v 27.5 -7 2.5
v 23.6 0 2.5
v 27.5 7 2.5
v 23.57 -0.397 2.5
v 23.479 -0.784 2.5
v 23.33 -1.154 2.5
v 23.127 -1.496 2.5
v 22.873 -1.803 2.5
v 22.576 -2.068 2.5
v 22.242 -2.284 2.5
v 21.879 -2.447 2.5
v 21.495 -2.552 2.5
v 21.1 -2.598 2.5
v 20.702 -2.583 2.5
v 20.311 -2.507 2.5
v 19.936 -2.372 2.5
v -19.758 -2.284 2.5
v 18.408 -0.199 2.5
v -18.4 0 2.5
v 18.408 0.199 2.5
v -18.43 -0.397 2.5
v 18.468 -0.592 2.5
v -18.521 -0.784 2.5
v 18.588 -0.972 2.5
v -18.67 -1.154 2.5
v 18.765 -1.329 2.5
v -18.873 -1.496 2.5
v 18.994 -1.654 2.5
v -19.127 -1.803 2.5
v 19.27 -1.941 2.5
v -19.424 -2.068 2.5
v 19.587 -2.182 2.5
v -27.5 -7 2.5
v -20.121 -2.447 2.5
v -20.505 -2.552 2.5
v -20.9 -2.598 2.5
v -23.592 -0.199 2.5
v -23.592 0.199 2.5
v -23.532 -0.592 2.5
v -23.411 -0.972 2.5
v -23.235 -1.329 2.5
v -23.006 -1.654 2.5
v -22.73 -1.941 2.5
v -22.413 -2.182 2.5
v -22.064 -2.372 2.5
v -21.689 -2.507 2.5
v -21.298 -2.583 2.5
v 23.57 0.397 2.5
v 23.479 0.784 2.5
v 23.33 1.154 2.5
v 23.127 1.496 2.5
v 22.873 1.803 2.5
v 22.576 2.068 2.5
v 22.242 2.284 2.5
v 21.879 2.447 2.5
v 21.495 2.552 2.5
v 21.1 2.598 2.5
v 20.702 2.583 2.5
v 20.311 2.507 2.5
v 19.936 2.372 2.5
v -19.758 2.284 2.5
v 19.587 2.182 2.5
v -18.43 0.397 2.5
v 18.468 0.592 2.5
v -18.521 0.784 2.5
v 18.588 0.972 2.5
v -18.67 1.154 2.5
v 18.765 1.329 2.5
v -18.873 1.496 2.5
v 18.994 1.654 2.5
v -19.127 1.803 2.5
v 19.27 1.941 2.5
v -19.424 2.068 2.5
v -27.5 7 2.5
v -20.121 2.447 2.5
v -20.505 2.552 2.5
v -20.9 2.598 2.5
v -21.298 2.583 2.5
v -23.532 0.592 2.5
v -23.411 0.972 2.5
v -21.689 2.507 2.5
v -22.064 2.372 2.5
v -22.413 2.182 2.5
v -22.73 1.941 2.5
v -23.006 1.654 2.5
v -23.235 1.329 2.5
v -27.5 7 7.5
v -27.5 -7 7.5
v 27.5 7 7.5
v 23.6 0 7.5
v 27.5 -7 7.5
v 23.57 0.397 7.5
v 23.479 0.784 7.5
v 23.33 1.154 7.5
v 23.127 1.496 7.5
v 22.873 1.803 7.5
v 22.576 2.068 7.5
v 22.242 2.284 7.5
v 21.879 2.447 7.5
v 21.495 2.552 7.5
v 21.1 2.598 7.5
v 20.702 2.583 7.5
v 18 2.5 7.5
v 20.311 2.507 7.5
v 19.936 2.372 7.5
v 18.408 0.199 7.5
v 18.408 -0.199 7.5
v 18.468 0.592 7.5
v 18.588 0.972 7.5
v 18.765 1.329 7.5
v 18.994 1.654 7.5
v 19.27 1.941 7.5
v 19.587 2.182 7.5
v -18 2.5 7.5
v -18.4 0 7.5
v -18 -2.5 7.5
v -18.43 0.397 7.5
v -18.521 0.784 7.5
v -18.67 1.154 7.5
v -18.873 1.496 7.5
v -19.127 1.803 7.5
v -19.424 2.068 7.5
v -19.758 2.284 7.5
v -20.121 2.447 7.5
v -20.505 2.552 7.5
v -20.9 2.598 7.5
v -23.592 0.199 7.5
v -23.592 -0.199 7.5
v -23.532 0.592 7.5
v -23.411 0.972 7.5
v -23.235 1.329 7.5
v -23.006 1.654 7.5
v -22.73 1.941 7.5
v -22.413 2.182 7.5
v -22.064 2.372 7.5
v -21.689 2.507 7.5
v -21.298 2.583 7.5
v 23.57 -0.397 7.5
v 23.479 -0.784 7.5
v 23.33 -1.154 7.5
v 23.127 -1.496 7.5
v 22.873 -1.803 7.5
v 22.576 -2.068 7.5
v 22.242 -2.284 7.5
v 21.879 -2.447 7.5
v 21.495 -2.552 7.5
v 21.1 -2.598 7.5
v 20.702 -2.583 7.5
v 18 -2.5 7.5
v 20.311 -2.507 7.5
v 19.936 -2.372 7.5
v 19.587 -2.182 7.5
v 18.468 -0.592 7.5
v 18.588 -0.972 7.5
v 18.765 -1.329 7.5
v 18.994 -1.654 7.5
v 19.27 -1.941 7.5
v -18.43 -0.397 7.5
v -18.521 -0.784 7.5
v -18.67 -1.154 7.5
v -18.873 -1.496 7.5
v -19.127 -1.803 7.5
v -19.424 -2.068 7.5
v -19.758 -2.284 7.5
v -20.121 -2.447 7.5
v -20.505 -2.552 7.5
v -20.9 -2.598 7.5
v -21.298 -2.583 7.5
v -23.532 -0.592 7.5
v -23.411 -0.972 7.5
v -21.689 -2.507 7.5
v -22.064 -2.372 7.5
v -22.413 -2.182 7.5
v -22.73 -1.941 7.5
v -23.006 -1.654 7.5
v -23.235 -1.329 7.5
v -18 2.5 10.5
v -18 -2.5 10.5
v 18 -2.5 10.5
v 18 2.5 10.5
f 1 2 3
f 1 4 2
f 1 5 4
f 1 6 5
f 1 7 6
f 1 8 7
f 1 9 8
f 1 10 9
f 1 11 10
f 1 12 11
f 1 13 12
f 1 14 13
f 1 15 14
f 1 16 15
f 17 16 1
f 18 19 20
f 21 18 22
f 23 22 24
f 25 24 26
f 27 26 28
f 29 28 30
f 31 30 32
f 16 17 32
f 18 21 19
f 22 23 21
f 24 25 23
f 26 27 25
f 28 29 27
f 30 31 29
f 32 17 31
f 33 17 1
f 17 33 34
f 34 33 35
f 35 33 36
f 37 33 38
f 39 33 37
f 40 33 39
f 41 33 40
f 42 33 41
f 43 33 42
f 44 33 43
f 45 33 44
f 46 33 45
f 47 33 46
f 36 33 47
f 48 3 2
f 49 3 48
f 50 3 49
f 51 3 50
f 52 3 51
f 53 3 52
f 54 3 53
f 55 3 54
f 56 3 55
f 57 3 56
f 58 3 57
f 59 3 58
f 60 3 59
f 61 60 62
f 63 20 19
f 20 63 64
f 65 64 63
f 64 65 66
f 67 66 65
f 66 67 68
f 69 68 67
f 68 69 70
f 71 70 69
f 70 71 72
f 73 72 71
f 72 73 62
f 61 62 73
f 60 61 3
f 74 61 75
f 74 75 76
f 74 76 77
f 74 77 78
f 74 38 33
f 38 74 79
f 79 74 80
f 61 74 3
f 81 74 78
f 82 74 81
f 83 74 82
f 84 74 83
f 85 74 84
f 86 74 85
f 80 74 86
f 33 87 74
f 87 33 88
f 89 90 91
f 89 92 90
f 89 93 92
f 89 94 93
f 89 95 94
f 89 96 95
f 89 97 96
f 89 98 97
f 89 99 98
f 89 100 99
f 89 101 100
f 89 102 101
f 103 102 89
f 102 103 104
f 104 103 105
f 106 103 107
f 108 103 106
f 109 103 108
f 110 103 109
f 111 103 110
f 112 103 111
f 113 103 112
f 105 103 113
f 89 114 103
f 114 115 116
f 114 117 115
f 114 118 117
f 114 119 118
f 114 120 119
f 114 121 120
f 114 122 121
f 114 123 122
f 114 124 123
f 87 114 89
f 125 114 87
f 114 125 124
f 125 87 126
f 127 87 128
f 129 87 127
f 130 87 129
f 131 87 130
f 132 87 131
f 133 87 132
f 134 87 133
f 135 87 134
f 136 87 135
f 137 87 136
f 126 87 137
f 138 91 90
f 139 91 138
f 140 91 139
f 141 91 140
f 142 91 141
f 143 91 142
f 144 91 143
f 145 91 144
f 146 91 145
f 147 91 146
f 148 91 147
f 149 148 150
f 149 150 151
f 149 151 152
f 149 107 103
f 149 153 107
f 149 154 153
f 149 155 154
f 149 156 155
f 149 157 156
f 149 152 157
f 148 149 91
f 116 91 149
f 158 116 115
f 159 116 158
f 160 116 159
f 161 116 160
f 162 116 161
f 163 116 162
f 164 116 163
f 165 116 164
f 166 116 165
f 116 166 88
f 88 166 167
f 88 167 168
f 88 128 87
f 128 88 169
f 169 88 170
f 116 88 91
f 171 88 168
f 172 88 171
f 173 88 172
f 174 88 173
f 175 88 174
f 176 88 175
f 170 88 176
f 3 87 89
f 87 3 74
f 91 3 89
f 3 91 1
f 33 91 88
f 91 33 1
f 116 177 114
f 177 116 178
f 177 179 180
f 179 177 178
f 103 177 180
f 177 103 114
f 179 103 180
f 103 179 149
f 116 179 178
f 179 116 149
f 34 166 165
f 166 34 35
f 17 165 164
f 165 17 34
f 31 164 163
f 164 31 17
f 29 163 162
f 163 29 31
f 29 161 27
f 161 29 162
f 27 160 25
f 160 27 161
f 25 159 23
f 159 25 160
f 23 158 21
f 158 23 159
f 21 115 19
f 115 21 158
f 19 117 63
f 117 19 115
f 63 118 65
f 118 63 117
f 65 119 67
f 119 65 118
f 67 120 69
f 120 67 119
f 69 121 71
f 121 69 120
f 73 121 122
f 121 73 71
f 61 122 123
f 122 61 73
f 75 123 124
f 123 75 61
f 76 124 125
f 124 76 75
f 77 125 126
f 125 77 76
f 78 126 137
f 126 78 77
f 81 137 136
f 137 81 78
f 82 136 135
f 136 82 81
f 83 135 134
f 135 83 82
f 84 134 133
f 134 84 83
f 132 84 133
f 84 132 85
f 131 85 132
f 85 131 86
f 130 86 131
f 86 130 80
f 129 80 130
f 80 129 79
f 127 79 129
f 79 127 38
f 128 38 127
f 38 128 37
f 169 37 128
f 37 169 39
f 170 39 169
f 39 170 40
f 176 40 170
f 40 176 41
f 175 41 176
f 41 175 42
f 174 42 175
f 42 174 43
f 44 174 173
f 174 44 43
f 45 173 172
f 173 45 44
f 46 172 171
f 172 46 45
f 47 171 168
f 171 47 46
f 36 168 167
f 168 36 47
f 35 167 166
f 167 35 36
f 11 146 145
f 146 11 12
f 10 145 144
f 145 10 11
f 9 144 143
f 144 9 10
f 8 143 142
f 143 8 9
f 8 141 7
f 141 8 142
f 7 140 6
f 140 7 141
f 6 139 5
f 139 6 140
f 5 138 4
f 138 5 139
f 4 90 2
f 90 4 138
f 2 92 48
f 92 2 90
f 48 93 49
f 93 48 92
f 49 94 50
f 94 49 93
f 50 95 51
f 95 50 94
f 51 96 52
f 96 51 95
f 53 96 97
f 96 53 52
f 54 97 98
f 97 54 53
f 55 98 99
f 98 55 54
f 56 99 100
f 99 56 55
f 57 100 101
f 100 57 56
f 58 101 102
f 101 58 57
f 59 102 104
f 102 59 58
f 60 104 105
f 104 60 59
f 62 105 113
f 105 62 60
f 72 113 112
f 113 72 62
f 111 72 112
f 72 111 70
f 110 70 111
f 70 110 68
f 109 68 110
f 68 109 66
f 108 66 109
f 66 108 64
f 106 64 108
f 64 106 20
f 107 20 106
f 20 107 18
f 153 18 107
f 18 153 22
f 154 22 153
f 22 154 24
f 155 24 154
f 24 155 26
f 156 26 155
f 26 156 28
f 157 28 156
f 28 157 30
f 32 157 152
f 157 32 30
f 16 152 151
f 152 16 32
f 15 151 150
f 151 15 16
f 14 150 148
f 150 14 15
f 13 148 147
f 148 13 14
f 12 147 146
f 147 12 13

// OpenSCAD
//$fn=60;
$fa=5;
$fs=.4;


difference(){
    body_all();
    mounting_holes();
}

module body_all(){
    translate([0,0,2.5]) linear_extrude(height=5) square([55,14],center=true);
    translate([0,0,3.5]) linear_extrude(height=7) square([36,5],center=true);
}

module mounting_holes(){
    translate([0,0,-10]) linear_extrude(height=20){
        translate([-21,0,0]) circle(d=5.2);
        translate([21,0,0]) circle(d=5.2);
    }
}
